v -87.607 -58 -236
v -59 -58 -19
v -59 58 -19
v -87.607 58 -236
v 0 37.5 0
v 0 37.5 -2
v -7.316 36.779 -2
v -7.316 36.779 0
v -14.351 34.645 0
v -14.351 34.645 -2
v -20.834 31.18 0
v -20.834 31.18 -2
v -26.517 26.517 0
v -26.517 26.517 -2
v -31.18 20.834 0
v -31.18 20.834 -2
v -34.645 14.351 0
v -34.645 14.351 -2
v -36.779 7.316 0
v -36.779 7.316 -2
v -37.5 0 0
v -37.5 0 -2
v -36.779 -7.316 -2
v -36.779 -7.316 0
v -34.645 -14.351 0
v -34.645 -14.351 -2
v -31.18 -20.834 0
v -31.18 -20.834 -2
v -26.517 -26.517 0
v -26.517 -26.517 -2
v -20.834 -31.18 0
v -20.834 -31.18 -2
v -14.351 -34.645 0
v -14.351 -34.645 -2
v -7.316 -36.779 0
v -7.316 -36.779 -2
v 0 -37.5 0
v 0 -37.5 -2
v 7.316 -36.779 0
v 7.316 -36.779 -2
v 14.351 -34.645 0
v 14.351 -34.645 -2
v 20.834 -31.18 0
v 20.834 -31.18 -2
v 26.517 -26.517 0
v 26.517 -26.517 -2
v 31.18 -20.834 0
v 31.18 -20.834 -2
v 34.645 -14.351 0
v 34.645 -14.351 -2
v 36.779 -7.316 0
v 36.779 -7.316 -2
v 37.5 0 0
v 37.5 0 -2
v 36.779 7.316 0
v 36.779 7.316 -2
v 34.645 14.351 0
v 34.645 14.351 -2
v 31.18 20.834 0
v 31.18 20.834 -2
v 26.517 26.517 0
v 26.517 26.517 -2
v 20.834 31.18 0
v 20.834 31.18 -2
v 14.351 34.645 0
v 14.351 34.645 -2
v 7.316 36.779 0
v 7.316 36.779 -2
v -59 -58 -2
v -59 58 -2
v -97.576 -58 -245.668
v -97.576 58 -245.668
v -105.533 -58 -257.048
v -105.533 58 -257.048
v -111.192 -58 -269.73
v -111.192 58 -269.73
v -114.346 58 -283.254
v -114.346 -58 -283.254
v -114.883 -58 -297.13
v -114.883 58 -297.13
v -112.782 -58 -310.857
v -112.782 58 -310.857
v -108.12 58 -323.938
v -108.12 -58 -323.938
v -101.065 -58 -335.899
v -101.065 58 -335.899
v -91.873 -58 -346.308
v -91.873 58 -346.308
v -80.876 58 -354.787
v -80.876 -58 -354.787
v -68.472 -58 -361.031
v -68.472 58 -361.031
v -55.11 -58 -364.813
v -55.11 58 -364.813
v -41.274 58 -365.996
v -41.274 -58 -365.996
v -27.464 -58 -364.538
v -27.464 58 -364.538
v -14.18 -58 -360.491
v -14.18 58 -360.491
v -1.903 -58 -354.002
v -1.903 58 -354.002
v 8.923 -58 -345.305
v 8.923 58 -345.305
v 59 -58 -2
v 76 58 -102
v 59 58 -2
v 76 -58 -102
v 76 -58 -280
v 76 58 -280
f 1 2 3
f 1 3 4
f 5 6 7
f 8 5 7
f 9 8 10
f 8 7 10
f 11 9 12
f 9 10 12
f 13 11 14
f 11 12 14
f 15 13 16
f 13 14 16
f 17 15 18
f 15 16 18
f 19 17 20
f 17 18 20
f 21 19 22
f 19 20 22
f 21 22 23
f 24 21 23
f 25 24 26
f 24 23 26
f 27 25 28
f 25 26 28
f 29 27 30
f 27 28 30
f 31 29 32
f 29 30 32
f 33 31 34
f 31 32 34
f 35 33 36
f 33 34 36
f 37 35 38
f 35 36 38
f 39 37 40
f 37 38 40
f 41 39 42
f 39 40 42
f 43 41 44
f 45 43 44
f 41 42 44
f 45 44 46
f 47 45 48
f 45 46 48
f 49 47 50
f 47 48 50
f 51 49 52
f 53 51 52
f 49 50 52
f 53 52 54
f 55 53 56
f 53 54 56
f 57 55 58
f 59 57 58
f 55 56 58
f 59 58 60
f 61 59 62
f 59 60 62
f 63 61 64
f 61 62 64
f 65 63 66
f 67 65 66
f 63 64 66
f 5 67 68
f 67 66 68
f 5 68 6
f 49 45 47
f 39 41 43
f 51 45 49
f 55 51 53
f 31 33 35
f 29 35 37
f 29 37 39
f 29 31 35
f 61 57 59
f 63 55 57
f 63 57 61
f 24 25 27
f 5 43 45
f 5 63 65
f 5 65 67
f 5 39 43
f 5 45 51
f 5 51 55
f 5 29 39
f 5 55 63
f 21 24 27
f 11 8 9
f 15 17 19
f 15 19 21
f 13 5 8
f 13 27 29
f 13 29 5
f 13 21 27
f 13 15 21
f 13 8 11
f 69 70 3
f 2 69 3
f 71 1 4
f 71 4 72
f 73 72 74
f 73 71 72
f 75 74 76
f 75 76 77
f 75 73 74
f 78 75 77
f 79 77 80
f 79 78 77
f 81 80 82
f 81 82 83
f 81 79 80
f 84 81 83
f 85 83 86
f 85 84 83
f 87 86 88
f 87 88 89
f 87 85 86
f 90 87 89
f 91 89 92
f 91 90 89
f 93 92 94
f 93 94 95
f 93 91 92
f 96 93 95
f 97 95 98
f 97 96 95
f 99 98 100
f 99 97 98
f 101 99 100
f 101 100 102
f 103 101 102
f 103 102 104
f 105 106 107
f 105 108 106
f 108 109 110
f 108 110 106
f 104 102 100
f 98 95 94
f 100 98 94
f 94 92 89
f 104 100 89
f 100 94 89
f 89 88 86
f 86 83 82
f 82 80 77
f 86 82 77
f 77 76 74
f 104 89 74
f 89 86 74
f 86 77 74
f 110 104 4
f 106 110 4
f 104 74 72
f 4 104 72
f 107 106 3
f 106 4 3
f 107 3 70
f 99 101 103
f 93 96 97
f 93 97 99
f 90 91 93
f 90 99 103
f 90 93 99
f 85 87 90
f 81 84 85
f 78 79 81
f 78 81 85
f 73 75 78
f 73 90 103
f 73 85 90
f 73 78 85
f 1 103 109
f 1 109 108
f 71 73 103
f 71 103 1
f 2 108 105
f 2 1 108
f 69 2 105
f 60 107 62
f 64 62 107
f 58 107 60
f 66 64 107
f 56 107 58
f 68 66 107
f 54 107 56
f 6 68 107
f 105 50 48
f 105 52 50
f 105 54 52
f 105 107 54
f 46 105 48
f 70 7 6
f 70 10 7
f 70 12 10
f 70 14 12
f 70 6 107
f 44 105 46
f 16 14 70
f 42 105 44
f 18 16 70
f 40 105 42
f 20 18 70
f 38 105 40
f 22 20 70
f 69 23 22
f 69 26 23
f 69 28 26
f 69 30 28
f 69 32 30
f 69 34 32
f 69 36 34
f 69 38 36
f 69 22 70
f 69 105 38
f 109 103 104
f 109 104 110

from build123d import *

# Parameters (mm, degrees)
BOSS_EXTRUDE1_DEPTH   = 58
SKETCH2_R             = 37.5
BOSS_EXTRUDE2_DEPTH   = 2
BODY_MOVE_COPY2_ANGLE = 120


with BuildPart() as part:
    # Sketch1 → Boss-Extrude1 (new, symmetric)
    with BuildSketch(Plane.XY):
        with BuildLine():
            Line((291, 0), (291, 17))
            Line((291, 17), (274, 17))
            Line((274, 17), (57, 45.607017004))
            ThreePointArc((57, 45.607017004), (-48.32227677, 54.71706834), (-52.304922539, -50.92342367))
            Line((-52.304922539, -50.92342367), (13, -118))
            Line((13, -118), (191, -118))
            Line((191, -118), (291, -101))
            Line((291, -101), (291, 0))
        make_face()
    extrude(amount=BOSS_EXTRUDE1_DEPTH, both=True)

    # Sketch2 → Boss-Extrude2 (add)
    with BuildSketch(Plane(origin=(291, 0, 0), x_dir=(0, 0, -1), z_dir=(1, 0, 0))):
        with Locations((0, -42)):
            Circle(SKETCH2_R)
    extrude(amount=BOSS_EXTRUDE2_DEPTH)


with BuildPart() as part_1:
    # Body-Move/Copy1: moved
    add(part.part.moved(Location((-293, 42, 0))))


with BuildPart() as part_2:
    # Body-Move/Copy2: moved
    add(part_1.part.rotate(Axis((0, 0, 0), (0.5773502691896272, -0.5773502691896252, 0.5773502691896252)), BODY_MOVE_COPY2_ANGLE))


solid = part_2.part
